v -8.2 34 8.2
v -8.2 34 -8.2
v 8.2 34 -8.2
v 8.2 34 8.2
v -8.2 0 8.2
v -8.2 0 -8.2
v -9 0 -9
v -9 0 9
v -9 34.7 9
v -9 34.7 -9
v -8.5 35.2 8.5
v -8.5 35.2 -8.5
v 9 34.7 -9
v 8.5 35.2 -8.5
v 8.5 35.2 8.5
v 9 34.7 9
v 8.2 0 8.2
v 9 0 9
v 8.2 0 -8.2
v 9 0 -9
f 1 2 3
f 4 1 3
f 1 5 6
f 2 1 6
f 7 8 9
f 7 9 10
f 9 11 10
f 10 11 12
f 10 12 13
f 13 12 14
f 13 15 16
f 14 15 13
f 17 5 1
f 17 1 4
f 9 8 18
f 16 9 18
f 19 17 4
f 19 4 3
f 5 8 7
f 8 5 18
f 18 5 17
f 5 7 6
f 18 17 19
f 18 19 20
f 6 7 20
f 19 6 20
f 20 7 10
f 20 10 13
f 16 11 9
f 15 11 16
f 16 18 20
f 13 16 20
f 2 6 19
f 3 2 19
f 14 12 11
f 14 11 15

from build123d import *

# Parameters (mm, degrees)
SKETCH1_W           = 18
SKETCH1_H           = 18
SKETCH1_W_2         = 16.4
SKETCH1_H_2         = 16.4
BOSS_EXTRUDE1_DEPTH = 34
SKETCH2_W           = 18
SKETCH2_H           = 18
BOSS_EXTRUDE2_DEPTH = 1.2
CHAMFER1_SIZE       = 0.5


with BuildPart() as part:
    # Sketch1 → Boss-Extrude1 (new body)
    with BuildSketch(Plane(origin=(0, 0, 0), x_dir=(1, 0, 0), z_dir=(0, 1, 0))):
        Rectangle(SKETCH1_W, SKETCH1_H)
        Rectangle(SKETCH1_W_2, SKETCH1_H_2, mode=Mode.SUBTRACT)
    extrude(amount=BOSS_EXTRUDE1_DEPTH)

    # Sketch2 → Boss-Extrude2 (add)
    with BuildSketch(Plane(origin=(0, 34, 0), x_dir=(1, 0, 0), z_dir=(0, 1, 0))):
        Rectangle(SKETCH2_W, SKETCH2_H)
    extrude(amount=BOSS_EXTRUDE2_DEPTH)

    # Chamfer1
    chamfer1_edges = [part.edges().sort_by_distance(p)[0] for p in [
        (-9, 35.2, 0),
        (0, 35.2, 9),
        (9, 35.2, 0),
        (0, 35.2, -9),
    ]]
    chamfer(chamfer1_edges, length=CHAMFER1_SIZE)


solid = part.part
